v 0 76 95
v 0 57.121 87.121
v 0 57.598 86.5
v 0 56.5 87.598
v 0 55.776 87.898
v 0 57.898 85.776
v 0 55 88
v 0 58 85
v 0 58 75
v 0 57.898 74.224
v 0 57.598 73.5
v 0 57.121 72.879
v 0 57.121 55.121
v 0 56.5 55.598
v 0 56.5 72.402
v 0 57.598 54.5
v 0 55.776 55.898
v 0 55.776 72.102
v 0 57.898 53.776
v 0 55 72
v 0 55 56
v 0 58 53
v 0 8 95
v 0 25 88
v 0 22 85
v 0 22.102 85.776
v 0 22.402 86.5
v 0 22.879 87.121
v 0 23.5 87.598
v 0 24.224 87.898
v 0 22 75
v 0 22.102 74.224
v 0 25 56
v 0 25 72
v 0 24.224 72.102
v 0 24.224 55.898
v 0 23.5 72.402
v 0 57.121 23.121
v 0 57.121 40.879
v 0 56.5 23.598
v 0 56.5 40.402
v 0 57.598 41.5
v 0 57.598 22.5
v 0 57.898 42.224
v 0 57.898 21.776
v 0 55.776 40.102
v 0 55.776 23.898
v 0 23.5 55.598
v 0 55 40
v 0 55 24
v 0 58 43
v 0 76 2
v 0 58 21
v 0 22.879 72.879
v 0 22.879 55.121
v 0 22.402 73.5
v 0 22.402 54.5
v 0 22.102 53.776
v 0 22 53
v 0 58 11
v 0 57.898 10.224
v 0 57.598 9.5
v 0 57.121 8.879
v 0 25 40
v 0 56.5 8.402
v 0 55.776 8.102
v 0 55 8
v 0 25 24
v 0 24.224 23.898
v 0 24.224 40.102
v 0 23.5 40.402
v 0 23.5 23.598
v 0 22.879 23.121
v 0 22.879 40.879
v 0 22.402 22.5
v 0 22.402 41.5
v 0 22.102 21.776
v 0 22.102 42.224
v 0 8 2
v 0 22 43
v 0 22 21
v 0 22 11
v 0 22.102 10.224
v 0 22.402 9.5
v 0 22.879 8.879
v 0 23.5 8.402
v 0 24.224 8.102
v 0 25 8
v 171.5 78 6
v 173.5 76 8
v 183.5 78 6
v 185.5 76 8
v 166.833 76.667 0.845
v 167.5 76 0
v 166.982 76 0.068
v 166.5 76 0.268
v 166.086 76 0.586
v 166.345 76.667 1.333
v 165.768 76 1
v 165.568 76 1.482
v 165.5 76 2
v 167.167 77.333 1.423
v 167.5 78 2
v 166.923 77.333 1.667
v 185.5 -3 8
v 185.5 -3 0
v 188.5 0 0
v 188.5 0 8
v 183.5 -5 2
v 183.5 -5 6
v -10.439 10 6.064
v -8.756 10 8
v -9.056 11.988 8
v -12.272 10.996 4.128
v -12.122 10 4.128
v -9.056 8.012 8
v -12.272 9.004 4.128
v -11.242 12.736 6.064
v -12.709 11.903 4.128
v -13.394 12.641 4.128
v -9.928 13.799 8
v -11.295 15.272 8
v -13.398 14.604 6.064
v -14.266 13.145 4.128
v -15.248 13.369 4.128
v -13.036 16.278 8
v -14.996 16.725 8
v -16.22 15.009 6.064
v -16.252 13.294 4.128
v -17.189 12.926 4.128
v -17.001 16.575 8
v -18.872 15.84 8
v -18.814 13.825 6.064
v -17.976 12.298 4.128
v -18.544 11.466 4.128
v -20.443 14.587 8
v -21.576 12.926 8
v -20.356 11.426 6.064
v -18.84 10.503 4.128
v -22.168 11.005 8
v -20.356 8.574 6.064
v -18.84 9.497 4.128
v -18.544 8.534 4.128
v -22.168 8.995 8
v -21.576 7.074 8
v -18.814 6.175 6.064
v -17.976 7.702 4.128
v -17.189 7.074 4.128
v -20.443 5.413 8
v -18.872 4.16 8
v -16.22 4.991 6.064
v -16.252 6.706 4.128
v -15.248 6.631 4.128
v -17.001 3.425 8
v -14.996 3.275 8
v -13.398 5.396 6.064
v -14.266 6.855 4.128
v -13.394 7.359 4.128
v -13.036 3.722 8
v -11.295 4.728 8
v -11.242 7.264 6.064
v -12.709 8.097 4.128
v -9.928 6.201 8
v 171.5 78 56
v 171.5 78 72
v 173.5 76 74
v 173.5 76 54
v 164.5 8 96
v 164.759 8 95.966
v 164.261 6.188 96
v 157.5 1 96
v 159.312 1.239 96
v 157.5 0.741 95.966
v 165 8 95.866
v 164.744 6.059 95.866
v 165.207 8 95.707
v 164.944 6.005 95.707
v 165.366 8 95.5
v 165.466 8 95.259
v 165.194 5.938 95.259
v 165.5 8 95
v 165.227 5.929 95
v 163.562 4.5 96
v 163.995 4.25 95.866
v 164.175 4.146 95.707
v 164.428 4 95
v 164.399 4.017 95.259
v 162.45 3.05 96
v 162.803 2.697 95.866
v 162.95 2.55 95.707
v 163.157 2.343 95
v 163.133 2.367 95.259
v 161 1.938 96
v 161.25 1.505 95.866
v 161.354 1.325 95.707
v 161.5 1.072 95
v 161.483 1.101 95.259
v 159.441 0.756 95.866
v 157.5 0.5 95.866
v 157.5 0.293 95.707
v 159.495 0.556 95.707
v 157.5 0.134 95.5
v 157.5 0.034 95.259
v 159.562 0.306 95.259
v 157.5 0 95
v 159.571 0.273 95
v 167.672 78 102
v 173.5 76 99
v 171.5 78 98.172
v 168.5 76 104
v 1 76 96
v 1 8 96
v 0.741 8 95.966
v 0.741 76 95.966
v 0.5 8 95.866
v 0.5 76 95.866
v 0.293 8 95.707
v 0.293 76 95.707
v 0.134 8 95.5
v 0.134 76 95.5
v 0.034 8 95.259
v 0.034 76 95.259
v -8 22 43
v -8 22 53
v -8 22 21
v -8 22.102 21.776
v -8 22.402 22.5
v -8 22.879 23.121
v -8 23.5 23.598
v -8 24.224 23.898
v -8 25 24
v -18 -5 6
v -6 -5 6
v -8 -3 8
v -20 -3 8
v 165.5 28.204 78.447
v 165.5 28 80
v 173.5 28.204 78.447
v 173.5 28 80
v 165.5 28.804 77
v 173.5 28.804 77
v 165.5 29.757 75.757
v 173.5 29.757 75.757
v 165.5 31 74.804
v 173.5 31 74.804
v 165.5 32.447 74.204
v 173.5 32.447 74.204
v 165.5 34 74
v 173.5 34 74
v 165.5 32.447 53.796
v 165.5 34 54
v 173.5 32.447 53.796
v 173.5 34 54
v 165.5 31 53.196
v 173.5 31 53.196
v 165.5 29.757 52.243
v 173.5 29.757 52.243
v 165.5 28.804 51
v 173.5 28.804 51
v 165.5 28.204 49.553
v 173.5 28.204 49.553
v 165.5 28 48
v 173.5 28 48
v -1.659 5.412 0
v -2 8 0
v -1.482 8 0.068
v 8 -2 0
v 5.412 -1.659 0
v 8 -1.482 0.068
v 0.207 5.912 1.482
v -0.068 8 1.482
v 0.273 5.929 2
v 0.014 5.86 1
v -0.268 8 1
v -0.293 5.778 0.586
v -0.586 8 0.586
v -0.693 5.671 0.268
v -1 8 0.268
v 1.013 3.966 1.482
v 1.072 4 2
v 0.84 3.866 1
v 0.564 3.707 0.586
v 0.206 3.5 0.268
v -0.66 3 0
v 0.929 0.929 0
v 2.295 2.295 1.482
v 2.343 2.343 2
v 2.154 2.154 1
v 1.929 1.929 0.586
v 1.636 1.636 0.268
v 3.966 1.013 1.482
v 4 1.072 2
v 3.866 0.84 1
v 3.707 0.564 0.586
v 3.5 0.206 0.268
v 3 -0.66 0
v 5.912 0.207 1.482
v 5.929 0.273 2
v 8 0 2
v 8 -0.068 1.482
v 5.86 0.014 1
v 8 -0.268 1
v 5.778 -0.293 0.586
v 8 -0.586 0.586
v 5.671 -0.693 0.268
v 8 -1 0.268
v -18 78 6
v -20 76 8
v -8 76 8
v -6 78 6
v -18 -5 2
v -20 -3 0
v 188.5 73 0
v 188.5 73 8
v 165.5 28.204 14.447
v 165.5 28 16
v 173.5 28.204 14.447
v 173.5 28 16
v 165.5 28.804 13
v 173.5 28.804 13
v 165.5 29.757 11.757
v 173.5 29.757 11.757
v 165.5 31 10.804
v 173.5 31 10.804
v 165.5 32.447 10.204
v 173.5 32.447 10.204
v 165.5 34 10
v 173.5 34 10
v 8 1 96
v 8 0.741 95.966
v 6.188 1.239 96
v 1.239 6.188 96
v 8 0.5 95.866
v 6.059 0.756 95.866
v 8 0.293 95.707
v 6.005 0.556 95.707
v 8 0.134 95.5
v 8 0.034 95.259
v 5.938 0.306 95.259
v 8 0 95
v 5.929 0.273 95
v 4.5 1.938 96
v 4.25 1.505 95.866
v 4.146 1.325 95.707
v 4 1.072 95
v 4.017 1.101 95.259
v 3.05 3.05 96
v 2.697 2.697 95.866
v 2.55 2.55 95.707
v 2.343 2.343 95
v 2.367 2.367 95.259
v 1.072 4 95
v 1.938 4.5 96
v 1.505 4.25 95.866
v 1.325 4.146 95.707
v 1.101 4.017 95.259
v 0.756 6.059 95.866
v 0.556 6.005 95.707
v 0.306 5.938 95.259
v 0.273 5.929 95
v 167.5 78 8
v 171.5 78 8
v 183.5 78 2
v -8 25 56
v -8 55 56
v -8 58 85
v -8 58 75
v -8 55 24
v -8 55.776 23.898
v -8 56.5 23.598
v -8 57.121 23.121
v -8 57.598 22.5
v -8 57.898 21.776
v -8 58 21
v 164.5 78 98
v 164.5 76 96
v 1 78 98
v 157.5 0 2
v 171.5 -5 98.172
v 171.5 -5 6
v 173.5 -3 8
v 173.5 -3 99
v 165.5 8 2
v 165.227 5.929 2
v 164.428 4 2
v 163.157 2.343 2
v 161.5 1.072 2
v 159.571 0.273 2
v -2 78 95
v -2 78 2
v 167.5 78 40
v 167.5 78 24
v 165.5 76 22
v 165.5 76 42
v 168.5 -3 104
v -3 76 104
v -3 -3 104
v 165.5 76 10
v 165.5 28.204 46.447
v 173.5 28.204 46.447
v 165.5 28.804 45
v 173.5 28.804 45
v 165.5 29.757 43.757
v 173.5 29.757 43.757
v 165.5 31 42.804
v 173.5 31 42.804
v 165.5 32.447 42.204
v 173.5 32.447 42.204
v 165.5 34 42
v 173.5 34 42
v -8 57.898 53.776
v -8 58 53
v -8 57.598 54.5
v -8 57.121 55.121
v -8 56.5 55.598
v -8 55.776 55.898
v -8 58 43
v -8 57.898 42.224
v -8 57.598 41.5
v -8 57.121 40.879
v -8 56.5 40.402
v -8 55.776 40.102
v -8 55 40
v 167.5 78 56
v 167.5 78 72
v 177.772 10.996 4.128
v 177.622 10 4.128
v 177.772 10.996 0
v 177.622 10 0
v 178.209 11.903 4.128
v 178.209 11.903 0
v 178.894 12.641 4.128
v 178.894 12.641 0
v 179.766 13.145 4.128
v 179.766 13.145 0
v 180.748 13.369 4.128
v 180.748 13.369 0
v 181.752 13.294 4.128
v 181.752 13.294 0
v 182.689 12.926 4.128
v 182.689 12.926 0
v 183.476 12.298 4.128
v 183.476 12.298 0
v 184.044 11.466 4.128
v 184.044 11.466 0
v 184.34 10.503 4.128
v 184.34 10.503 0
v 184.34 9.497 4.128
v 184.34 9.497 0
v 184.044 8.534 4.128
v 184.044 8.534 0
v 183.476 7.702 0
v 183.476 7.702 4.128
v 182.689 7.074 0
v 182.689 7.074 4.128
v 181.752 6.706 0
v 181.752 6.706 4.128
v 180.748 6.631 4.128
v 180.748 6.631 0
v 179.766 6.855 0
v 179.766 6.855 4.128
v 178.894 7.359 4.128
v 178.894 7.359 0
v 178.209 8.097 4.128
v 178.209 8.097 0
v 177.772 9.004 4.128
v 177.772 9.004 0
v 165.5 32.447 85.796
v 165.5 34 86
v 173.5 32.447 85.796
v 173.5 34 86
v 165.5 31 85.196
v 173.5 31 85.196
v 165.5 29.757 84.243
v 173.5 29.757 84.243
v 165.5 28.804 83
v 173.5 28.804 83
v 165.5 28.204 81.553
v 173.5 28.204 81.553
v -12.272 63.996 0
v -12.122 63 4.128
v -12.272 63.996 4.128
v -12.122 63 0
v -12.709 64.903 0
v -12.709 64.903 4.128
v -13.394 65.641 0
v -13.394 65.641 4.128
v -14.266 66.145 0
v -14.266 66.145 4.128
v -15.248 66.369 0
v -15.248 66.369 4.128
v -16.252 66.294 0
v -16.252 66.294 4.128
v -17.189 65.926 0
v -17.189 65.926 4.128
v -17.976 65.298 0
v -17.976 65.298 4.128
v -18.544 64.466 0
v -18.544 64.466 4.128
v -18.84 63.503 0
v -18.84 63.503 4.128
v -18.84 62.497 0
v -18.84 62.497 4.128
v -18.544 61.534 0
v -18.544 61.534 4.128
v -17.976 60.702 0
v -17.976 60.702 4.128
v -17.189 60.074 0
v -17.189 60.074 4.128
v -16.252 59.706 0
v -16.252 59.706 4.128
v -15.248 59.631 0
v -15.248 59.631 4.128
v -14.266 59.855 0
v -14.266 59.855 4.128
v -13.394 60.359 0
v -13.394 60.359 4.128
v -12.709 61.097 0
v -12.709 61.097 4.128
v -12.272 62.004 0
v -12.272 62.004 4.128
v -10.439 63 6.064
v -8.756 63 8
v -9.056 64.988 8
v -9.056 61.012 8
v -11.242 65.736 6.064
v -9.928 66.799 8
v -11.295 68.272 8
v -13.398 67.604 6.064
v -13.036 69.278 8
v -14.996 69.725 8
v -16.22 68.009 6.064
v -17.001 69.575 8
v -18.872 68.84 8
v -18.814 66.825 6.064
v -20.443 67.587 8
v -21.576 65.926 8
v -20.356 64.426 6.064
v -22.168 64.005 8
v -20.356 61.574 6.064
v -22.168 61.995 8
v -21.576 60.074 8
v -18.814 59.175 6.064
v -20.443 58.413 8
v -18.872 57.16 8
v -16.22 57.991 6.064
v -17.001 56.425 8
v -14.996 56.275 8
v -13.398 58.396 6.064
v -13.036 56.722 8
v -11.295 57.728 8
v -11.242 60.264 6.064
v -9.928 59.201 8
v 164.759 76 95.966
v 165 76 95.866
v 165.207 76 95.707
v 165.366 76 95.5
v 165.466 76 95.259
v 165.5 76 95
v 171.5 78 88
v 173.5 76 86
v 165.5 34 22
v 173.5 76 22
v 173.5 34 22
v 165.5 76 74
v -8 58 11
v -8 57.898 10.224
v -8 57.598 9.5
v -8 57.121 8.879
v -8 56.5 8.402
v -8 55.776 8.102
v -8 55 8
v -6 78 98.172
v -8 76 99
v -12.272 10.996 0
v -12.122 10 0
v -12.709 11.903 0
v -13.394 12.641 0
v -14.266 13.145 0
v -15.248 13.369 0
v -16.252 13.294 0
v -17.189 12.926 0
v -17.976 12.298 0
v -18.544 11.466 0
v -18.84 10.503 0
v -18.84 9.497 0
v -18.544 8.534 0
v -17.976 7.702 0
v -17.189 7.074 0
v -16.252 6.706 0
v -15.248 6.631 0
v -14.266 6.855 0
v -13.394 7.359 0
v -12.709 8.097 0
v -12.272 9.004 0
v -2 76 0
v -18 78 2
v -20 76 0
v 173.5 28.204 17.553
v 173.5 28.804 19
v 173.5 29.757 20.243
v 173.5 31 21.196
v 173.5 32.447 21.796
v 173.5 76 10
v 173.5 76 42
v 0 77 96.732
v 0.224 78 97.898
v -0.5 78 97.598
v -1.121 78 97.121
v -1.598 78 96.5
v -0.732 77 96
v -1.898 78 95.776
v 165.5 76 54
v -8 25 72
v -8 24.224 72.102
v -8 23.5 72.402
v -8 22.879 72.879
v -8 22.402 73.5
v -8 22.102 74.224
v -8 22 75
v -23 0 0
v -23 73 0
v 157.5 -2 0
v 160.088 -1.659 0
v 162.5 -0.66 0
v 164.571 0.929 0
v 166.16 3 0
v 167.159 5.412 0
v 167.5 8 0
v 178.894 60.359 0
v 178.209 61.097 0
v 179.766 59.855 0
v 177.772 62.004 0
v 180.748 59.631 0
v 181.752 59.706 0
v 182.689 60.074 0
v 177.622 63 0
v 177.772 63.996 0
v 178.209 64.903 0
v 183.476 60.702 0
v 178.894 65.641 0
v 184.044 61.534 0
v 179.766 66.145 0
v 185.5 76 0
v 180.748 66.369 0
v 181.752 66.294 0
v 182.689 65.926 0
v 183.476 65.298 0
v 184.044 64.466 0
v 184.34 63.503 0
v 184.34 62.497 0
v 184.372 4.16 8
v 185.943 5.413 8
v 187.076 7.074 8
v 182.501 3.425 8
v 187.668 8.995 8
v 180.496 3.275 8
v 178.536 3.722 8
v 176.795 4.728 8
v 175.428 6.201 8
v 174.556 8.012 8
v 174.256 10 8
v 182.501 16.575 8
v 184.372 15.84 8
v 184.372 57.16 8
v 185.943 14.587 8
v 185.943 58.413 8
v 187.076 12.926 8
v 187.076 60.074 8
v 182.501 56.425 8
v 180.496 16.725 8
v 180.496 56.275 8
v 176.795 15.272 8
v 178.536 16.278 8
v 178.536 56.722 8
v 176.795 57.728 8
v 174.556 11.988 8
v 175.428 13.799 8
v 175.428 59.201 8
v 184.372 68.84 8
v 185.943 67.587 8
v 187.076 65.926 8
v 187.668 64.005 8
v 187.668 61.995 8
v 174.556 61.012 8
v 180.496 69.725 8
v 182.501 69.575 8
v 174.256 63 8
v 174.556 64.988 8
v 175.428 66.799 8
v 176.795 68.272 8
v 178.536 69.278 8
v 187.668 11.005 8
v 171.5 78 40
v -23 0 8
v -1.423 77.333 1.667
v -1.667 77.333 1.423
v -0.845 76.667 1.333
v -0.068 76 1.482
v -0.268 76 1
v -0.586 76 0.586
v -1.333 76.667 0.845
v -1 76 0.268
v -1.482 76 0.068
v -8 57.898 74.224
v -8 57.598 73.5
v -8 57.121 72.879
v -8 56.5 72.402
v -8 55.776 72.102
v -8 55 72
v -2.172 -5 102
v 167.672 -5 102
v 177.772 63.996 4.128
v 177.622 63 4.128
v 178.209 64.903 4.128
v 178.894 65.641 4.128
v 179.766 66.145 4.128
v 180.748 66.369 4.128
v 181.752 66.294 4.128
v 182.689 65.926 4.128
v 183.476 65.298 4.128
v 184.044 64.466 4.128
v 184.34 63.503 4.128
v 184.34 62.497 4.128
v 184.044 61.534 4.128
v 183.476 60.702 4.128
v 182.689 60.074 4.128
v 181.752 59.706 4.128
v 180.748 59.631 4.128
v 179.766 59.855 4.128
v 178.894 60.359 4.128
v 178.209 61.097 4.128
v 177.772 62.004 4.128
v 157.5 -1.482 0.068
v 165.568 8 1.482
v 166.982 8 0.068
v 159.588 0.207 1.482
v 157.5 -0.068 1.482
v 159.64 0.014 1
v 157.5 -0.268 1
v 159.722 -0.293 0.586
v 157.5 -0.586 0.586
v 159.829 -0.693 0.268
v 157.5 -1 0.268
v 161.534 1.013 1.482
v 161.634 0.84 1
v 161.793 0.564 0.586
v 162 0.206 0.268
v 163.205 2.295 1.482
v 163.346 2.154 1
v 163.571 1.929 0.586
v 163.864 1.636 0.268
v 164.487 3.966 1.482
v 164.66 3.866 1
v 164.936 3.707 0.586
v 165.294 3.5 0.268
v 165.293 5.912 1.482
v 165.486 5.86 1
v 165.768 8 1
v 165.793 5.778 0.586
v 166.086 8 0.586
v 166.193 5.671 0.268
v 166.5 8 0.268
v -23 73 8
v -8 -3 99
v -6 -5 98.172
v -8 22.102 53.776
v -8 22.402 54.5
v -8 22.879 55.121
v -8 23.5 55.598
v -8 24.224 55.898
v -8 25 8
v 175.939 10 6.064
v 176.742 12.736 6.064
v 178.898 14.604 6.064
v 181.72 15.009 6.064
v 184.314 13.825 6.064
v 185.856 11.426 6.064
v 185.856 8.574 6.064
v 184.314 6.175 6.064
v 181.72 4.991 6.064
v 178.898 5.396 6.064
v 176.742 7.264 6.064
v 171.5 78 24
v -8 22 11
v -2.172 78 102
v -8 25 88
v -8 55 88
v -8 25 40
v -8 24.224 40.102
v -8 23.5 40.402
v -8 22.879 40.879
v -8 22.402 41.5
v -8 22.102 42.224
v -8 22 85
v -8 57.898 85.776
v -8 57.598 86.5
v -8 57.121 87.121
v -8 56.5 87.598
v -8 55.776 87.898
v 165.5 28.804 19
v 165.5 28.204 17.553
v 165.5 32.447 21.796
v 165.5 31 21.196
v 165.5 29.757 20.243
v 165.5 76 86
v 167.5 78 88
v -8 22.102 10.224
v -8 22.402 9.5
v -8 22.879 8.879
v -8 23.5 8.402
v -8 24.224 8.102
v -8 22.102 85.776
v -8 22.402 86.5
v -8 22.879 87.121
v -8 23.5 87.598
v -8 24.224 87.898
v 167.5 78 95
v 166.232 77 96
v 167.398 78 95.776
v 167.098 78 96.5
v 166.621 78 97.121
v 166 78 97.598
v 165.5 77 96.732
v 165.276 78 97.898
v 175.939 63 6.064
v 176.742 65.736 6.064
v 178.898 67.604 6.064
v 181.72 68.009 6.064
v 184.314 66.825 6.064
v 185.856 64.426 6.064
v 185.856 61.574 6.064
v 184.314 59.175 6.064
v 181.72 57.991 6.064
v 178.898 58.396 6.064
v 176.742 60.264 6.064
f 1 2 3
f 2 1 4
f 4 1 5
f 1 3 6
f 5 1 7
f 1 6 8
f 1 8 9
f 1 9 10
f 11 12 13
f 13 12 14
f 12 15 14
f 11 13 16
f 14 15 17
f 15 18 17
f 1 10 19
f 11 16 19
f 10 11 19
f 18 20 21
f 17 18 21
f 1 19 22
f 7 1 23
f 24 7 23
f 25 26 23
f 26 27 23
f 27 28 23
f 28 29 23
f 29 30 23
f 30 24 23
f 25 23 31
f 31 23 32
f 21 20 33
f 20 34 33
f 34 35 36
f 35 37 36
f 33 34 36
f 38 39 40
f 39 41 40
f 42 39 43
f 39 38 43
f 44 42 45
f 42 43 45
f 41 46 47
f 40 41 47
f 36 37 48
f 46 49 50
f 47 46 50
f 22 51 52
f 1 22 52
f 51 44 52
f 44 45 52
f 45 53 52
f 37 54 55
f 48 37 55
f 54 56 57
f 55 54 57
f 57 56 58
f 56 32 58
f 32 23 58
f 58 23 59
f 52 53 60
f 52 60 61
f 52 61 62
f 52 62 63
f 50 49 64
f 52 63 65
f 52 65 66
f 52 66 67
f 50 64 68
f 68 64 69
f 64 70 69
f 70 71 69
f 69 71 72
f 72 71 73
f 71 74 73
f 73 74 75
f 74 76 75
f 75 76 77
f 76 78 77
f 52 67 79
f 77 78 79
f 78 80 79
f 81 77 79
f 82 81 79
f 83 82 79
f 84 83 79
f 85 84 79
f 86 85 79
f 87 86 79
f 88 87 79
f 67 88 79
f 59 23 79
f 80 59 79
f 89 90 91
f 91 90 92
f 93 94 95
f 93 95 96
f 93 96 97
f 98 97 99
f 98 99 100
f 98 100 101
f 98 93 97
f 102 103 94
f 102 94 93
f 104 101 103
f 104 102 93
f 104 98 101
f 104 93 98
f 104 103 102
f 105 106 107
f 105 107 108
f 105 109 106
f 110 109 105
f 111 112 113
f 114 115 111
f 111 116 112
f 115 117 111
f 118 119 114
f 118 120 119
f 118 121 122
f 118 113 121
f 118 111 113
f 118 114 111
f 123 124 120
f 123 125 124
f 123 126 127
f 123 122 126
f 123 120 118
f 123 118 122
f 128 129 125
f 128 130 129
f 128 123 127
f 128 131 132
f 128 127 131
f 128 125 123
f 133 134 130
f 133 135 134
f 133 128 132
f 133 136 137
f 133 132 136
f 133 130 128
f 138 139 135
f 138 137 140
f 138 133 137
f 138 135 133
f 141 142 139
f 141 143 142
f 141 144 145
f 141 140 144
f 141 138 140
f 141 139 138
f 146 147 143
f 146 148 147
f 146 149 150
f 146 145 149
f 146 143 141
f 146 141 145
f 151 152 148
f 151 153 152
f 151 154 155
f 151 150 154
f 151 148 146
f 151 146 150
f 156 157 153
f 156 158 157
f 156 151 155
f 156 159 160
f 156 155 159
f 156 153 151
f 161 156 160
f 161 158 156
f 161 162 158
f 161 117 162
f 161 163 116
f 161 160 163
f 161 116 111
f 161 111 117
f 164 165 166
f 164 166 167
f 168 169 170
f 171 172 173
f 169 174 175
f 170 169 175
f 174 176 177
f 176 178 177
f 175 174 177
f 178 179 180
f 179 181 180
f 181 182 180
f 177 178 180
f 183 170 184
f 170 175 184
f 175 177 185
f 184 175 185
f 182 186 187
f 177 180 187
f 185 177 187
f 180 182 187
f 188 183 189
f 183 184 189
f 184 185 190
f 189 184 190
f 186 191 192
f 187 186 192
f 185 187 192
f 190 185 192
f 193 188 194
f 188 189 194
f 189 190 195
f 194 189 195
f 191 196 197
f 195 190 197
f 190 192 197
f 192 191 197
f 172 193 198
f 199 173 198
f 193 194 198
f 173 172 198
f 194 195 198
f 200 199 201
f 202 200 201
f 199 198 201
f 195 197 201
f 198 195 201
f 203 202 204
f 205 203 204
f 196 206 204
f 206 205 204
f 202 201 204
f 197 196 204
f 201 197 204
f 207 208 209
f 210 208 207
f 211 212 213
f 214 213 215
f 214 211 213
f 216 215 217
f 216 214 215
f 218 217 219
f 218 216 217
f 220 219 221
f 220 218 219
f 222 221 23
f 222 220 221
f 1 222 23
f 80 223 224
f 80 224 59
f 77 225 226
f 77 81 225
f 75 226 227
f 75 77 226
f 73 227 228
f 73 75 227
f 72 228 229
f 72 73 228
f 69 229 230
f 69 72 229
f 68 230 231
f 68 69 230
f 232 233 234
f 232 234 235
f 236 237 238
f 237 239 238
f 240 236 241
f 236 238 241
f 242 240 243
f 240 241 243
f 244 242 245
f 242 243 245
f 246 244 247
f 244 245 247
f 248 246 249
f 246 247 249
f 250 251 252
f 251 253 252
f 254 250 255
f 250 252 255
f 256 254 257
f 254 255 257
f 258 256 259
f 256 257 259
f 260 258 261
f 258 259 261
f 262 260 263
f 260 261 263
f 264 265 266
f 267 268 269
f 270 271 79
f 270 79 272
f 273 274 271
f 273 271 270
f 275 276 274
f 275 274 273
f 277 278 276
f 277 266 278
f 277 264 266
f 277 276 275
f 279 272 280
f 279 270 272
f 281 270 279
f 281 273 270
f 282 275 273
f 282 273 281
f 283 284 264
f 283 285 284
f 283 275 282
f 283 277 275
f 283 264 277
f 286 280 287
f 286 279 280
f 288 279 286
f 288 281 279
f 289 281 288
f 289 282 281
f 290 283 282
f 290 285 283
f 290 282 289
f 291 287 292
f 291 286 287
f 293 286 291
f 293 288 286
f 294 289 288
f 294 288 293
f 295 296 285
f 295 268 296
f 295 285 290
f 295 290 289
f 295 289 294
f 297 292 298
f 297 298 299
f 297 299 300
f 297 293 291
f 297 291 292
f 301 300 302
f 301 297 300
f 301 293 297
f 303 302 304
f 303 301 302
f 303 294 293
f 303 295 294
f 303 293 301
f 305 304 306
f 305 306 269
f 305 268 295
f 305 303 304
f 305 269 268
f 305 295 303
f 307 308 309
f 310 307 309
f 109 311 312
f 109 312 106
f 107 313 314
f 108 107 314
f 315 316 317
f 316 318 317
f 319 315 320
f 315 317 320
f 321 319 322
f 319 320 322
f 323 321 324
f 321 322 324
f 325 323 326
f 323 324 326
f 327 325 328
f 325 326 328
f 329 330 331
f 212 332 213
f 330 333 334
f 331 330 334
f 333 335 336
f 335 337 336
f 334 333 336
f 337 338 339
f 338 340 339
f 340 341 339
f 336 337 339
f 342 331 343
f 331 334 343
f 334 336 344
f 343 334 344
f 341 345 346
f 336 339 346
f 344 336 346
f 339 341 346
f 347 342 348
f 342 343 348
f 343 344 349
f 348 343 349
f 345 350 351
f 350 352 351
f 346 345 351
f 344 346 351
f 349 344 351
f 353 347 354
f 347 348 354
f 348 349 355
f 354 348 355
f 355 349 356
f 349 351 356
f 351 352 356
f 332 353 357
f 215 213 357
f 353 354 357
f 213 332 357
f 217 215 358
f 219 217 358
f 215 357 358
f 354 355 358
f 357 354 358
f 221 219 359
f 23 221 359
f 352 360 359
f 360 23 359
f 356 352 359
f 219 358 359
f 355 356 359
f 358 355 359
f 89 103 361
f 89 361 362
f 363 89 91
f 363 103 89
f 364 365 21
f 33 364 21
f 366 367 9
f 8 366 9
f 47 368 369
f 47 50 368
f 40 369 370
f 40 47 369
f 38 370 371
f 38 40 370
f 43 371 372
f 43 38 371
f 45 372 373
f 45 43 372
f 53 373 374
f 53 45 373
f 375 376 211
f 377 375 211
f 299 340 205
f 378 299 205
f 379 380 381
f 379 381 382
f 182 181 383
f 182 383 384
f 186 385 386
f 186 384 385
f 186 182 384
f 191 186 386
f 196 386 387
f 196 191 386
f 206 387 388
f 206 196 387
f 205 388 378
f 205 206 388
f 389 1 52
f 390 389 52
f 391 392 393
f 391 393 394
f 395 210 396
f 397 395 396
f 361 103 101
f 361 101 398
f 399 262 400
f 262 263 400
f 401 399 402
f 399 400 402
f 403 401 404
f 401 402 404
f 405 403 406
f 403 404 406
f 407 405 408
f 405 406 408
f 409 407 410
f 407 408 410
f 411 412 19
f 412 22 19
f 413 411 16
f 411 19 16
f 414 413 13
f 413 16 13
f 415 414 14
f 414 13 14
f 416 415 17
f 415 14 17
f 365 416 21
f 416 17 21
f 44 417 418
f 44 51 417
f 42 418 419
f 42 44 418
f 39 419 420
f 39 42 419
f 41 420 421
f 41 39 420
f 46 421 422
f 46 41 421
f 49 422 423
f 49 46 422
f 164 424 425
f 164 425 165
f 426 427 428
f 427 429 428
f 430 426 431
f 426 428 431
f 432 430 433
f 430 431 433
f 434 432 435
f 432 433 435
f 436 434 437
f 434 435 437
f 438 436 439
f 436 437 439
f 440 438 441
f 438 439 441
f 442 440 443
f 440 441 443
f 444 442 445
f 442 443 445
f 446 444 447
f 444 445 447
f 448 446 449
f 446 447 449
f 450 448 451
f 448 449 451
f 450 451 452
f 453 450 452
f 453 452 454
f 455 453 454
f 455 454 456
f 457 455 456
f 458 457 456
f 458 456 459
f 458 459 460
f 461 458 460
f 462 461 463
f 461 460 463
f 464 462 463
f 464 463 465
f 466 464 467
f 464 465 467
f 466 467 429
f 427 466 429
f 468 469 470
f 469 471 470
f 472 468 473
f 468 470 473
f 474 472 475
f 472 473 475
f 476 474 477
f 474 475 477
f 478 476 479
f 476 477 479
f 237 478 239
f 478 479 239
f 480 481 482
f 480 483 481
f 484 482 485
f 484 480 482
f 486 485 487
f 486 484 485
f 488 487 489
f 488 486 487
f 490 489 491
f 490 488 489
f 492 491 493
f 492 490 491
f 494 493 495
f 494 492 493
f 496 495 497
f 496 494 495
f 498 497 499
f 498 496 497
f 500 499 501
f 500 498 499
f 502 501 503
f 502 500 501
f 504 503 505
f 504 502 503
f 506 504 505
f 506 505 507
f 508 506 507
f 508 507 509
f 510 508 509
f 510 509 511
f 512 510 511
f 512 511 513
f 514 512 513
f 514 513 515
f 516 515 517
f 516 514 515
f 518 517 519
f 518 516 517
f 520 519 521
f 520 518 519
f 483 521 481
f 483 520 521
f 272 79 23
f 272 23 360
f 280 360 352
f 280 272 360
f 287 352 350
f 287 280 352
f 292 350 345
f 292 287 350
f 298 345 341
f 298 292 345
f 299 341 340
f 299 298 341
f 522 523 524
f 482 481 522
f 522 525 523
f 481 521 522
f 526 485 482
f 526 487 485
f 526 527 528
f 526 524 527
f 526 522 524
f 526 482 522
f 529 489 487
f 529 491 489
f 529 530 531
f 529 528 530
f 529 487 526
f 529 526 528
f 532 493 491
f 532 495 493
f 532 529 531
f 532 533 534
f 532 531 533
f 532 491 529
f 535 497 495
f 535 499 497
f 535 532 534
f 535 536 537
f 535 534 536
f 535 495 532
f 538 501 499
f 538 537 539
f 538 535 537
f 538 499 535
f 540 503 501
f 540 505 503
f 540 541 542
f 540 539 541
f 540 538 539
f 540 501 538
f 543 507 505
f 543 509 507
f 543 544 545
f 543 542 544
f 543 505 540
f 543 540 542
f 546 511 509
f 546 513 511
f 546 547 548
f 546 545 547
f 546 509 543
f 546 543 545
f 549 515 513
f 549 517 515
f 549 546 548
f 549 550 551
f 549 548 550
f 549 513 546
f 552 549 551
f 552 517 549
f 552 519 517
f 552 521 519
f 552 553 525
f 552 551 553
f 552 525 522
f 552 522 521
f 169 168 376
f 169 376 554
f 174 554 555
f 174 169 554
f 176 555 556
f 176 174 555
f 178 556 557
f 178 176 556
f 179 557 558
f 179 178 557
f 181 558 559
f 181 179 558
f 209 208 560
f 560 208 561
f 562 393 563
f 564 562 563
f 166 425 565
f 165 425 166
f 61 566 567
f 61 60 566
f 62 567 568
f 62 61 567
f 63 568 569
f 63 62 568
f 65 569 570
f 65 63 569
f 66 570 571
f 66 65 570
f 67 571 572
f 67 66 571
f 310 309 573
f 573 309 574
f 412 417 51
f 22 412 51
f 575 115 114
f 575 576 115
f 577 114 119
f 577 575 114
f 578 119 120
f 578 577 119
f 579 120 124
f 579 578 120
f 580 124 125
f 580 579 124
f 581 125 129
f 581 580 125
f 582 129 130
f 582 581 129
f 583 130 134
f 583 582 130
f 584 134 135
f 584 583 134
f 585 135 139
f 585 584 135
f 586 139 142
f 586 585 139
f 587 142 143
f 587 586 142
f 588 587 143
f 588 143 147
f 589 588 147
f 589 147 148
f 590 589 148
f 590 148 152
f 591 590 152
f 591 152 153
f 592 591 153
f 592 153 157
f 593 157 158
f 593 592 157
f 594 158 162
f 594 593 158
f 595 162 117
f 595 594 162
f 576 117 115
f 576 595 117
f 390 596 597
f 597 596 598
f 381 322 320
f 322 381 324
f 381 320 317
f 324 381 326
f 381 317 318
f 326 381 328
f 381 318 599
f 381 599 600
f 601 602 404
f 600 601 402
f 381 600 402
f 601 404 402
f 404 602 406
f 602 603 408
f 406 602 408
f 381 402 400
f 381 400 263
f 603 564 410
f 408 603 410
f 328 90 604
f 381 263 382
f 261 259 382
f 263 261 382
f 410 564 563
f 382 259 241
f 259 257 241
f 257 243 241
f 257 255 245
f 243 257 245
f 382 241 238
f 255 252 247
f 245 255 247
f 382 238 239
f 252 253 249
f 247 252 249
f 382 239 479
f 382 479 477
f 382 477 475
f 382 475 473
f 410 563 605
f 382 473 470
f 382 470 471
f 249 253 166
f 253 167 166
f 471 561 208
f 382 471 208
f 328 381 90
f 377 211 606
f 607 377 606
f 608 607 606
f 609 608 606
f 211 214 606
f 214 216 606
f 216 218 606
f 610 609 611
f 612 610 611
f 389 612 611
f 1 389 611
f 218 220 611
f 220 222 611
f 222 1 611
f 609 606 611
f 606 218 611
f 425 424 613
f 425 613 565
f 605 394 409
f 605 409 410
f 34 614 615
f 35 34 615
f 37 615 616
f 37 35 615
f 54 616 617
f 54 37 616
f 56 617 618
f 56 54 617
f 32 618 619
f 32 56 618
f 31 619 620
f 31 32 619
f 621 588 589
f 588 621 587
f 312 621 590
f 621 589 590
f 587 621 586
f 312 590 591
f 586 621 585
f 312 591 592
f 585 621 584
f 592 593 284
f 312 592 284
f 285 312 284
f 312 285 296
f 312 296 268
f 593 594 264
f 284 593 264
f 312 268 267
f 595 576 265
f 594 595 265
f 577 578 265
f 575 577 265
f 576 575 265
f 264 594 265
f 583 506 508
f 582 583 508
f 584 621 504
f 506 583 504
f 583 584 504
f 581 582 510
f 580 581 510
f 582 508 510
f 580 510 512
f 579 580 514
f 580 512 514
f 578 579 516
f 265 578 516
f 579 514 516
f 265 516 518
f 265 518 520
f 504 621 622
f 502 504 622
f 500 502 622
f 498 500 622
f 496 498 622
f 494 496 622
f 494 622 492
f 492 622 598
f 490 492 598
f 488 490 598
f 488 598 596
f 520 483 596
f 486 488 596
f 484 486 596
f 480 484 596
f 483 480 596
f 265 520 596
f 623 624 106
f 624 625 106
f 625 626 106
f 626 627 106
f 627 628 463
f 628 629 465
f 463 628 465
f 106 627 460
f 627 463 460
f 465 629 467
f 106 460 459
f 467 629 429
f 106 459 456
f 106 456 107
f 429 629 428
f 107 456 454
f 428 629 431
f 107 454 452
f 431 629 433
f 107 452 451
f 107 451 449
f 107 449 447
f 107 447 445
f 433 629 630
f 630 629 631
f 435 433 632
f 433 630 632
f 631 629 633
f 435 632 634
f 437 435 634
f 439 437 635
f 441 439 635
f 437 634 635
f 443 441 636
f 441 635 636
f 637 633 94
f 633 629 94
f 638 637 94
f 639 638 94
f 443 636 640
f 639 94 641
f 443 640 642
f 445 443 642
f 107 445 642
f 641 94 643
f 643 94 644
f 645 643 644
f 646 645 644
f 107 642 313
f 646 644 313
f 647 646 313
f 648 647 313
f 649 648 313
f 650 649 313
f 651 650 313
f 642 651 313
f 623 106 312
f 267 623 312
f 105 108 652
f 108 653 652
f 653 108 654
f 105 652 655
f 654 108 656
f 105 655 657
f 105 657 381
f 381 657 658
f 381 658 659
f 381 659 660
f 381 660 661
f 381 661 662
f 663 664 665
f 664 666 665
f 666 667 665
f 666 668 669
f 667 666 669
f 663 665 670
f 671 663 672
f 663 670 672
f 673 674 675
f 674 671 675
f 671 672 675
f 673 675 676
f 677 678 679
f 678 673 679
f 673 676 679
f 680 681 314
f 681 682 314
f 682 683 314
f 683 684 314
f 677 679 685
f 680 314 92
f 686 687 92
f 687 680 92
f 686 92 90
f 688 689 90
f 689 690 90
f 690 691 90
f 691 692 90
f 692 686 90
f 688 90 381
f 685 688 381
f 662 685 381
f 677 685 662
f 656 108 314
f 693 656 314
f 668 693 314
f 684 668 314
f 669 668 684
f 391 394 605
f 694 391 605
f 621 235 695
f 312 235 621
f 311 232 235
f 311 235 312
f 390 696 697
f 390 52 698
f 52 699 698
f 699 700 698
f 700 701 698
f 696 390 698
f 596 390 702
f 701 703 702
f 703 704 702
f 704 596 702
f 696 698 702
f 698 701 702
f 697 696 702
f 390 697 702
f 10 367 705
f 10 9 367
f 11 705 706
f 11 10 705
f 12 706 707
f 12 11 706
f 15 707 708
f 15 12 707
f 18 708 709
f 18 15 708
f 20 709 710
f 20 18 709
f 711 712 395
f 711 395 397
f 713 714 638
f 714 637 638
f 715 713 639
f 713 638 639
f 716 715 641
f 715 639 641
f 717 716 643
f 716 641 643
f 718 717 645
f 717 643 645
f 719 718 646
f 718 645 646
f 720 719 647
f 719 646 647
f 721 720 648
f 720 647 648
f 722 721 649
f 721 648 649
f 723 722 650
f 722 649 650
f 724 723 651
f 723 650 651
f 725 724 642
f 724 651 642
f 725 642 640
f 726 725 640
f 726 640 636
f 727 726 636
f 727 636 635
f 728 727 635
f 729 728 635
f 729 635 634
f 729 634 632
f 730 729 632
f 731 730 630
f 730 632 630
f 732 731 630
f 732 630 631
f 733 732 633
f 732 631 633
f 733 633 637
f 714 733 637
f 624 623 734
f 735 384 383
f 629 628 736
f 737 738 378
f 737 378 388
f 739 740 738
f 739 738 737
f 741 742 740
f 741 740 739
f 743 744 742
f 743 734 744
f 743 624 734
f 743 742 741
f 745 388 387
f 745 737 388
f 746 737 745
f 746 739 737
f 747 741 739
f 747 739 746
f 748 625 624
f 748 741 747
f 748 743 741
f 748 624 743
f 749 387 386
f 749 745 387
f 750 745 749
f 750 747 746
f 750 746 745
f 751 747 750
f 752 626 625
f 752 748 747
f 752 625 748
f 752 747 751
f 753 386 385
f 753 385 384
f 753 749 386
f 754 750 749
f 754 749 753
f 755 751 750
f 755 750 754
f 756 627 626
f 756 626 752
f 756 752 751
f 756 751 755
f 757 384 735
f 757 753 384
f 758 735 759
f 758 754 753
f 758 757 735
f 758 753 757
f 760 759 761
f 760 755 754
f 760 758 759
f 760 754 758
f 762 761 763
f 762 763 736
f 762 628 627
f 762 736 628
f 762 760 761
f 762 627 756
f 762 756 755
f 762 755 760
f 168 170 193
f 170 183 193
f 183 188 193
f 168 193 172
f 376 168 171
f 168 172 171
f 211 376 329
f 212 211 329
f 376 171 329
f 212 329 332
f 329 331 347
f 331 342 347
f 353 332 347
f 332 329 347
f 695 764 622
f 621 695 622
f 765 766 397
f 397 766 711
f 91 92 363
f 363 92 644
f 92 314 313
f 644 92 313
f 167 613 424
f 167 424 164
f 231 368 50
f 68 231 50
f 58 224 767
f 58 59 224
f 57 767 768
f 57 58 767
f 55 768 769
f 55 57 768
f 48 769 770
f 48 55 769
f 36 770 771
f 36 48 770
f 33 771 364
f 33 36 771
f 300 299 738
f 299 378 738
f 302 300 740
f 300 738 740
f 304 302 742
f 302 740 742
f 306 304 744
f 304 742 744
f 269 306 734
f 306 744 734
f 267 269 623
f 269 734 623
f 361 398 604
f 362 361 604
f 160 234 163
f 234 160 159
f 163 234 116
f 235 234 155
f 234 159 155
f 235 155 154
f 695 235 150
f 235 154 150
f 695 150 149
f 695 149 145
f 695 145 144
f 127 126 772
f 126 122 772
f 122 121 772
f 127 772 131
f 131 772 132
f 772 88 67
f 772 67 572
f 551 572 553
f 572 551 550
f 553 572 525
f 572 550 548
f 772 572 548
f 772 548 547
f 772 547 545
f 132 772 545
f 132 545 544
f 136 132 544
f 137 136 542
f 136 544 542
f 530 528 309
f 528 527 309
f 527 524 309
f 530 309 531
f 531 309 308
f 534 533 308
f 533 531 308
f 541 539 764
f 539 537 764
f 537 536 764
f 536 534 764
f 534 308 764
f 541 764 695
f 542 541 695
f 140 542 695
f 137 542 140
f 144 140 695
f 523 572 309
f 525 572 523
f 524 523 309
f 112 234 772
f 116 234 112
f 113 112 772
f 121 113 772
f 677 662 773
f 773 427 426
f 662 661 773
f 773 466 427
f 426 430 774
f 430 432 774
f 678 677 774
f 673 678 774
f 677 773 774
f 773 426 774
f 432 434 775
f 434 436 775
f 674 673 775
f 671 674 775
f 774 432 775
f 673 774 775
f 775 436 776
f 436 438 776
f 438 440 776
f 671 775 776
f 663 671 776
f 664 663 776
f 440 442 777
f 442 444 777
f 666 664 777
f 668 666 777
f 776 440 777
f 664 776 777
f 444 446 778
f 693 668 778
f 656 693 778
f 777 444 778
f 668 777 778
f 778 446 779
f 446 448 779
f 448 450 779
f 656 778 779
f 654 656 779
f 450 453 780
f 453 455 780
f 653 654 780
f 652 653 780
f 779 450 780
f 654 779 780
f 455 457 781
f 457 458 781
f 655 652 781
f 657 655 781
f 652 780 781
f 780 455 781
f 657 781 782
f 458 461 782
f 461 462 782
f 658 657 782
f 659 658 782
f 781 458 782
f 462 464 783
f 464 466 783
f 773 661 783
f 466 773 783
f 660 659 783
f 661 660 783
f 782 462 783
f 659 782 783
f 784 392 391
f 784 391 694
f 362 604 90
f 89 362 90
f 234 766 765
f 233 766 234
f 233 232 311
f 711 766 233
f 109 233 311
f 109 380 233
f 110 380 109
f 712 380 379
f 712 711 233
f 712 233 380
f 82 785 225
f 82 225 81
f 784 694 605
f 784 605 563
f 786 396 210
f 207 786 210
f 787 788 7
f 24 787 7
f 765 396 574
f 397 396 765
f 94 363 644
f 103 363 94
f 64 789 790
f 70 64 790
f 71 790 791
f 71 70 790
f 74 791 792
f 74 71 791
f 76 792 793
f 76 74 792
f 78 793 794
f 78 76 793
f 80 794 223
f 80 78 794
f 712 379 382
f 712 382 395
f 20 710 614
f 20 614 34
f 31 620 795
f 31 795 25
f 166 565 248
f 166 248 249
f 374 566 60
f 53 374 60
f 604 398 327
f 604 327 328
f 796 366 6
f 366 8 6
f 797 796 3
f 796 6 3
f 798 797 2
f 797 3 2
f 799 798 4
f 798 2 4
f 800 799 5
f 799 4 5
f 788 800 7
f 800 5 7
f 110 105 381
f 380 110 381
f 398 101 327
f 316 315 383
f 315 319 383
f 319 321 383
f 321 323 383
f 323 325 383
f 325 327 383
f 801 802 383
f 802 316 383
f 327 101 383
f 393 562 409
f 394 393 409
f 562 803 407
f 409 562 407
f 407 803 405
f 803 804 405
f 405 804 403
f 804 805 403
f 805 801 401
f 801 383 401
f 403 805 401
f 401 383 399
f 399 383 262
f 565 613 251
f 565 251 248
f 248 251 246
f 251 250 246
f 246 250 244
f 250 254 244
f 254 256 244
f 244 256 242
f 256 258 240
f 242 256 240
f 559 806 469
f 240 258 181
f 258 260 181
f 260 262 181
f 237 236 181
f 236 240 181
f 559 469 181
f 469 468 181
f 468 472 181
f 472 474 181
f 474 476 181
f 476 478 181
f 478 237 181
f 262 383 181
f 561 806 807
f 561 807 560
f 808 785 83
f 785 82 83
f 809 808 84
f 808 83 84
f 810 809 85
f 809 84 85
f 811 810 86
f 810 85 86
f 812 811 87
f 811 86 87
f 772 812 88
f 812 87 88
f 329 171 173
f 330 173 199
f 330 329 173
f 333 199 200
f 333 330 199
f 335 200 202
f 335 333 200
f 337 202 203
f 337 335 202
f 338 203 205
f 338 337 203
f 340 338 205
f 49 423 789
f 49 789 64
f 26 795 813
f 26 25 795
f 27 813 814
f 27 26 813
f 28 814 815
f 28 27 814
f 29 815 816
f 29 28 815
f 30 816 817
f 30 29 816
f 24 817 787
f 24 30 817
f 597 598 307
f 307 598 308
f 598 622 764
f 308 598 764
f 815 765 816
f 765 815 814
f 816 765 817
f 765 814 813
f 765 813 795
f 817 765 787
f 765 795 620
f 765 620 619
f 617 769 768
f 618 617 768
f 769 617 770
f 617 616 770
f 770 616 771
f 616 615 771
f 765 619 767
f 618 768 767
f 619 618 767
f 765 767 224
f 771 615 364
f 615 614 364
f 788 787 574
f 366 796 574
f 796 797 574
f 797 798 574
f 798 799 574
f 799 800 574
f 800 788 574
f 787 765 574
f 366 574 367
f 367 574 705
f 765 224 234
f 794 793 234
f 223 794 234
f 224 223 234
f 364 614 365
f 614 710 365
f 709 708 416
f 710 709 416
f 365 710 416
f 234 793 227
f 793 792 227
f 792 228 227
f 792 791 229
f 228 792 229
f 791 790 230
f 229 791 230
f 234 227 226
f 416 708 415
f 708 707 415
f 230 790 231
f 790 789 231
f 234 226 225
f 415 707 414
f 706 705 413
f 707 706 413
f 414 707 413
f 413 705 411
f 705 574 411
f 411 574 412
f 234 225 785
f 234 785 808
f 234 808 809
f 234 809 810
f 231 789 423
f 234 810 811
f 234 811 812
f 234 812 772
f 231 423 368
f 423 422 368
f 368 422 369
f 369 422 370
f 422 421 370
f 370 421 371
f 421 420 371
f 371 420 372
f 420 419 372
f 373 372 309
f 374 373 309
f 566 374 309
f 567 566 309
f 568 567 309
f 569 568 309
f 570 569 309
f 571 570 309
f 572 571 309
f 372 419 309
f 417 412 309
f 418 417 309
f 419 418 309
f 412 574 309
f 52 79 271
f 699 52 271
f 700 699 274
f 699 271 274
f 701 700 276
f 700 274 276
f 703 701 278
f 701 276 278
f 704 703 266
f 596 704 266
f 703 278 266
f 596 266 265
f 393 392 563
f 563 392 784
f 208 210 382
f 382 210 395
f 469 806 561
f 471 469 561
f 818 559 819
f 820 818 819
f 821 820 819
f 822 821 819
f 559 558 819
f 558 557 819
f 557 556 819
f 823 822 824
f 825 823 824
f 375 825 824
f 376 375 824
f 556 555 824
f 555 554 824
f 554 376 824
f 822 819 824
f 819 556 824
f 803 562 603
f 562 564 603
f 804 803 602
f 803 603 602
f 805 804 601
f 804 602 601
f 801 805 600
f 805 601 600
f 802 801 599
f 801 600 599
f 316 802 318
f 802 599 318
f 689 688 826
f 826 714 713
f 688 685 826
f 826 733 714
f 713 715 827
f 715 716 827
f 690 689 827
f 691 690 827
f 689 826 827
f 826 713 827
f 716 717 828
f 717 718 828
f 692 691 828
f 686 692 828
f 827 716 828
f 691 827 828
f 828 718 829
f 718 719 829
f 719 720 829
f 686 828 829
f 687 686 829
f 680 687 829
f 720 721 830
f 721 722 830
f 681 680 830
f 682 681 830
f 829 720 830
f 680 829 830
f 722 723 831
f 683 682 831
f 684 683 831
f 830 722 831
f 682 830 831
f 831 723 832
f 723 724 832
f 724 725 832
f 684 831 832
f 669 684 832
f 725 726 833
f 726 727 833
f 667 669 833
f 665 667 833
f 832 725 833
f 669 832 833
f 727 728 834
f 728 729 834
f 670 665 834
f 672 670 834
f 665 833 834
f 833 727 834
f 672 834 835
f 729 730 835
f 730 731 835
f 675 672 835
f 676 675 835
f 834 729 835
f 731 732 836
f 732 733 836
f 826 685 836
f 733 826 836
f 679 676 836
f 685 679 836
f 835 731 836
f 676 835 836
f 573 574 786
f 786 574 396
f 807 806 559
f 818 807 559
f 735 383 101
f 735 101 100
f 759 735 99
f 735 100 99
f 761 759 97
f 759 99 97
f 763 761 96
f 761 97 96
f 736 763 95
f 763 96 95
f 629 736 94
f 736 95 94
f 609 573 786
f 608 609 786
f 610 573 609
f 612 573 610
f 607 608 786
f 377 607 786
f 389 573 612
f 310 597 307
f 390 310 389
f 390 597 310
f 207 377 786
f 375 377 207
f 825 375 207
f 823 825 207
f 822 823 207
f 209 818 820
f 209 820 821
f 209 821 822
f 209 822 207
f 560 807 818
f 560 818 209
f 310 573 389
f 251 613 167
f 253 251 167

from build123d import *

# Parameters (mm, degrees)
BOSS_EXTRUDE1_DEPTH                                 = 78
BOSS_EXTRUDE2_DEPTH                                 = 5
CUT_EXTRUDE1_START                                  = -20
SKETCH4_W                                           = 8
SKETCH4_H                                           = 16
CUT_EXTRUDE1_DEPTH                                  = 36
SKETCH4_5_W                                         = 8
SKETCH4_5_H                                         = 12
CUT_EXTRUDE2_DEPTH                                  = 50
CSK_FOR_1_4_FLAT_HEAD_SOCKET_CAP_SCREW1_D           = 6.7564
CSK_FOR_1_4_FLAT_HEAD_SOCKET_CAP_SCREW1_CSINK_D     = 13.4874
CSK_FOR_1_4_FLAT_HEAD_SOCKET_CAP_SCREW1_CSINK_ANGLE = 82
FILLET1_R                                           = 3
FILLET2_R                                           = 6
FILLET4_R                                           = 8
FILLET3_R                                           = 2
FILLET5_R                                           = 1
CHAMFER1_SIZE                                       = 5
CHAMFER2_SIZE                                       = 2


with BuildPart() as part:
    # Sketch1 → Boss-Extrude1 (new body)
    with BuildSketch(Plane(origin=(0, 0, 0), x_dir=(1, 0, 0), z_dir=(0, 1, 0))):
        Polygon((0, 0), (-23, 0), (-23, -8), (-8, -8), (-8, -104), (173.5, -104), (173.5, -8), (188.5, -8), (188.5, 0), (165.5, 0), (165.5, -96), (0, -96), align=None)
    extrude(amount=BOSS_EXTRUDE1_DEPTH)

    # Sketch2 → Boss-Extrude2 (add)
    with BuildSketch(Plane.XZ):
        Polygon((-23, 0), (188.5, 0), (188.5, 8), (173.5, 8), (173.5, 104), (-8, 104), (-8, 8), (-23, 8), align=None)
    extrude(amount=BOSS_EXTRUDE2_DEPTH)

    # Sketch4 → Cut-Extrude1 (cut)
    with BuildSketch(Plane(origin=(0, 78, 0), x_dir=(1, 0, 0), z_dir=(0, 1, 0)).offset(CUT_EXTRUDE1_START)):
        with Locations((-4, -16)):
            Rectangle(SKETCH4_W, SKETCH4_H)
        with Locations((-4, -48)):
            Rectangle(SKETCH4_W, SKETCH4_H)
        with Locations((-4, -80)):
            Rectangle(SKETCH4_W, SKETCH4_H)
    extrude(amount=-CUT_EXTRUDE1_DEPTH, mode=Mode.SUBTRACT)

    # Sketch4<5> → Cut-Extrude2 (cut)
    with BuildSketch(Plane(origin=(0, 78, 0), x_dir=(1, 0, 0), z_dir=(0, 1, 0))):
        with Locations((169.5, -48)):
            Rectangle(SKETCH4_5_W, SKETCH4_5_H)
        with Locations((169.5, -80)):
            Rectangle(SKETCH4_5_W, SKETCH4_5_H)
        with Locations((169.5, -16)):
            Rectangle(SKETCH4_5_W, SKETCH4_5_H)
    extrude(amount=-CUT_EXTRUDE2_DEPTH, mode=Mode.SUBTRACT)

    # CSK for 1/4 Flat Head Socket Cap Screw1 (through all)
    with Locations(Plane.XY.offset(8)):
        with Locations((181, 10), (181, 63)):
            csk_for_1_4_flat_head_socket_cap_screw1 = CounterSinkHole(CSK_FOR_1_4_FLAT_HEAD_SOCKET_CAP_SCREW1_D / 2, CSK_FOR_1_4_FLAT_HEAD_SOCKET_CAP_SCREW1_CSINK_D / 2, counter_sink_angle=CSK_FOR_1_4_FLAT_HEAD_SOCKET_CAP_SCREW1_CSINK_ANGLE)

    # Mirror1: CSK for 1/4 Flat Head Socket Cap Screw1 across plane
    add(csk_for_1_4_flat_head_socket_cap_screw1.mirror(Plane(origin=(82.75, 0, 0), x_dir=(0, 0, 1), z_dir=(1, 0, 0))), mode=Mode.SUBTRACT)

    # Fillet1
    fillet1_edges = [part.edges().sort_by_distance(p)[0] for p in [
        (-4, 22, 24),
        (-4, 22, 8),
        (-4, 58, 8),
        (-4, 58, 24),
        (-4, 58, 56),
        (-4, 58, 40),
        (-4, 22, 56),
        (-4, 22, 40),
        (-4, 58, 88),
        (-4, 58, 72),
        (-4, 22, 88),
        (-4, 22, 72),
    ]]
    fillet(fillet1_edges, radius=FILLET1_R)

    # Fillet2
    fillet2_edges = [part.edges().sort_by_distance(p)[0] for p in [
        (169.5, 28, 74),
        (169.5, 28, 42),
        (169.5, 28, 86),
        (169.5, 28, 54),
        (169.5, 28, 22),
        (169.5, 28, 10),
    ]]
    fillet(fillet2_edges, radius=FILLET2_R - 0.0001)  # a hair under: the kernel refuses the full size

    # Fillet4
    fillet4_edges = [part.edges().sort_by_distance(p)[0] for p in [
        (165.5, 0, 48),
        (0, 0, 48),
    ]]
    fillet(fillet4_edges, radius=FILLET4_R)

    # Fillet3
    fillet3_edges = [part.edges().sort_by_distance(p)[0] for p in [
        (165.5, 43, 0),
        (0, 43, 0),
        (82.75, 0, 0),
        (2.343145751, 2.343145751, 0),
        (163.156854249, 2.343145751, 0),
    ]]
    fillet(fillet3_edges, radius=FILLET3_R)

    # Fillet5
    fillet5_edges = [part.edges().sort_by_distance(p)[0] for p in [
        (0, 43, 96),
        (165.5, 43, 96),
        (82.75, 0, 96),
        (163.156854249, 2.343145751, 96),
        (2.343145751, 2.343145751, 96),
    ]]
    fillet(fillet5_edges, radius=FILLET5_R)

    # Chamfer1
    chamfer1_edges = [part.edges().sort_by_distance(p)[0] for p in [
        (-23, 78, 4),
        (173.5, 36.5, 104),
        (-8, 36.5, 104),
        (188.5, 78, 4),
        (-23, -5, 4),
        (188.5, -5, 4),
    ]]
    chamfer(chamfer1_edges, length=CHAMFER1_SIZE)

    # Chamfer2
    chamfer2_edges = [part.edges().sort_by_distance(p)[0] for p in [
        (82.75, -5, 0),
        (178.5, -5, 8),
        (173.5, -5, 53.5),
        (171, -5, 101.5),
        (82.75, -5, 104),
        (-5.5, -5, 101.5),
        (-13, -5, 8),
        (-8, -5, 53.5),
        (173.5, 78, 9),
        (178.5, 78, 8),
        (173.5, 78, 32),
        (165.5, 78, 32),
        (165.5, 78, 64),
        (173.5, 78, 64),
        (165.5, 78, 6),
        (175.5, 78, 0),
        (173.5, 78, 92.5),
        (171, 78, 101.5),
        (82.75, 78, 104),
        (-5.5, 78, 101.5),
        (-8, 78, 53.5),
        (-13, 78, 8),
        (165.5, 78, 90.5),
        (82.75, 78, 96),
        (-10, 78, 0),
        (0, 78, 48.5),
        (169.5, 78, 22),
        (169.5, 78, 42),
        (169.5, 78, 54),
        (169.5, 78, 74),
        (169.5, 78, 10),
        (169.5, 78, 86),
        (166.085786438, 78, 0.585786438),
        (-0.585786438, 78, 0.585786438),
        (165.207106781, 78, 95.707106781),
        (0.292893219, 78, 95.707106781),
    ]]
    chamfer(chamfer2_edges, length=CHAMFER2_SIZE - 0.0001)  # a hair under: the kernel refuses the full size


solid = part.part
